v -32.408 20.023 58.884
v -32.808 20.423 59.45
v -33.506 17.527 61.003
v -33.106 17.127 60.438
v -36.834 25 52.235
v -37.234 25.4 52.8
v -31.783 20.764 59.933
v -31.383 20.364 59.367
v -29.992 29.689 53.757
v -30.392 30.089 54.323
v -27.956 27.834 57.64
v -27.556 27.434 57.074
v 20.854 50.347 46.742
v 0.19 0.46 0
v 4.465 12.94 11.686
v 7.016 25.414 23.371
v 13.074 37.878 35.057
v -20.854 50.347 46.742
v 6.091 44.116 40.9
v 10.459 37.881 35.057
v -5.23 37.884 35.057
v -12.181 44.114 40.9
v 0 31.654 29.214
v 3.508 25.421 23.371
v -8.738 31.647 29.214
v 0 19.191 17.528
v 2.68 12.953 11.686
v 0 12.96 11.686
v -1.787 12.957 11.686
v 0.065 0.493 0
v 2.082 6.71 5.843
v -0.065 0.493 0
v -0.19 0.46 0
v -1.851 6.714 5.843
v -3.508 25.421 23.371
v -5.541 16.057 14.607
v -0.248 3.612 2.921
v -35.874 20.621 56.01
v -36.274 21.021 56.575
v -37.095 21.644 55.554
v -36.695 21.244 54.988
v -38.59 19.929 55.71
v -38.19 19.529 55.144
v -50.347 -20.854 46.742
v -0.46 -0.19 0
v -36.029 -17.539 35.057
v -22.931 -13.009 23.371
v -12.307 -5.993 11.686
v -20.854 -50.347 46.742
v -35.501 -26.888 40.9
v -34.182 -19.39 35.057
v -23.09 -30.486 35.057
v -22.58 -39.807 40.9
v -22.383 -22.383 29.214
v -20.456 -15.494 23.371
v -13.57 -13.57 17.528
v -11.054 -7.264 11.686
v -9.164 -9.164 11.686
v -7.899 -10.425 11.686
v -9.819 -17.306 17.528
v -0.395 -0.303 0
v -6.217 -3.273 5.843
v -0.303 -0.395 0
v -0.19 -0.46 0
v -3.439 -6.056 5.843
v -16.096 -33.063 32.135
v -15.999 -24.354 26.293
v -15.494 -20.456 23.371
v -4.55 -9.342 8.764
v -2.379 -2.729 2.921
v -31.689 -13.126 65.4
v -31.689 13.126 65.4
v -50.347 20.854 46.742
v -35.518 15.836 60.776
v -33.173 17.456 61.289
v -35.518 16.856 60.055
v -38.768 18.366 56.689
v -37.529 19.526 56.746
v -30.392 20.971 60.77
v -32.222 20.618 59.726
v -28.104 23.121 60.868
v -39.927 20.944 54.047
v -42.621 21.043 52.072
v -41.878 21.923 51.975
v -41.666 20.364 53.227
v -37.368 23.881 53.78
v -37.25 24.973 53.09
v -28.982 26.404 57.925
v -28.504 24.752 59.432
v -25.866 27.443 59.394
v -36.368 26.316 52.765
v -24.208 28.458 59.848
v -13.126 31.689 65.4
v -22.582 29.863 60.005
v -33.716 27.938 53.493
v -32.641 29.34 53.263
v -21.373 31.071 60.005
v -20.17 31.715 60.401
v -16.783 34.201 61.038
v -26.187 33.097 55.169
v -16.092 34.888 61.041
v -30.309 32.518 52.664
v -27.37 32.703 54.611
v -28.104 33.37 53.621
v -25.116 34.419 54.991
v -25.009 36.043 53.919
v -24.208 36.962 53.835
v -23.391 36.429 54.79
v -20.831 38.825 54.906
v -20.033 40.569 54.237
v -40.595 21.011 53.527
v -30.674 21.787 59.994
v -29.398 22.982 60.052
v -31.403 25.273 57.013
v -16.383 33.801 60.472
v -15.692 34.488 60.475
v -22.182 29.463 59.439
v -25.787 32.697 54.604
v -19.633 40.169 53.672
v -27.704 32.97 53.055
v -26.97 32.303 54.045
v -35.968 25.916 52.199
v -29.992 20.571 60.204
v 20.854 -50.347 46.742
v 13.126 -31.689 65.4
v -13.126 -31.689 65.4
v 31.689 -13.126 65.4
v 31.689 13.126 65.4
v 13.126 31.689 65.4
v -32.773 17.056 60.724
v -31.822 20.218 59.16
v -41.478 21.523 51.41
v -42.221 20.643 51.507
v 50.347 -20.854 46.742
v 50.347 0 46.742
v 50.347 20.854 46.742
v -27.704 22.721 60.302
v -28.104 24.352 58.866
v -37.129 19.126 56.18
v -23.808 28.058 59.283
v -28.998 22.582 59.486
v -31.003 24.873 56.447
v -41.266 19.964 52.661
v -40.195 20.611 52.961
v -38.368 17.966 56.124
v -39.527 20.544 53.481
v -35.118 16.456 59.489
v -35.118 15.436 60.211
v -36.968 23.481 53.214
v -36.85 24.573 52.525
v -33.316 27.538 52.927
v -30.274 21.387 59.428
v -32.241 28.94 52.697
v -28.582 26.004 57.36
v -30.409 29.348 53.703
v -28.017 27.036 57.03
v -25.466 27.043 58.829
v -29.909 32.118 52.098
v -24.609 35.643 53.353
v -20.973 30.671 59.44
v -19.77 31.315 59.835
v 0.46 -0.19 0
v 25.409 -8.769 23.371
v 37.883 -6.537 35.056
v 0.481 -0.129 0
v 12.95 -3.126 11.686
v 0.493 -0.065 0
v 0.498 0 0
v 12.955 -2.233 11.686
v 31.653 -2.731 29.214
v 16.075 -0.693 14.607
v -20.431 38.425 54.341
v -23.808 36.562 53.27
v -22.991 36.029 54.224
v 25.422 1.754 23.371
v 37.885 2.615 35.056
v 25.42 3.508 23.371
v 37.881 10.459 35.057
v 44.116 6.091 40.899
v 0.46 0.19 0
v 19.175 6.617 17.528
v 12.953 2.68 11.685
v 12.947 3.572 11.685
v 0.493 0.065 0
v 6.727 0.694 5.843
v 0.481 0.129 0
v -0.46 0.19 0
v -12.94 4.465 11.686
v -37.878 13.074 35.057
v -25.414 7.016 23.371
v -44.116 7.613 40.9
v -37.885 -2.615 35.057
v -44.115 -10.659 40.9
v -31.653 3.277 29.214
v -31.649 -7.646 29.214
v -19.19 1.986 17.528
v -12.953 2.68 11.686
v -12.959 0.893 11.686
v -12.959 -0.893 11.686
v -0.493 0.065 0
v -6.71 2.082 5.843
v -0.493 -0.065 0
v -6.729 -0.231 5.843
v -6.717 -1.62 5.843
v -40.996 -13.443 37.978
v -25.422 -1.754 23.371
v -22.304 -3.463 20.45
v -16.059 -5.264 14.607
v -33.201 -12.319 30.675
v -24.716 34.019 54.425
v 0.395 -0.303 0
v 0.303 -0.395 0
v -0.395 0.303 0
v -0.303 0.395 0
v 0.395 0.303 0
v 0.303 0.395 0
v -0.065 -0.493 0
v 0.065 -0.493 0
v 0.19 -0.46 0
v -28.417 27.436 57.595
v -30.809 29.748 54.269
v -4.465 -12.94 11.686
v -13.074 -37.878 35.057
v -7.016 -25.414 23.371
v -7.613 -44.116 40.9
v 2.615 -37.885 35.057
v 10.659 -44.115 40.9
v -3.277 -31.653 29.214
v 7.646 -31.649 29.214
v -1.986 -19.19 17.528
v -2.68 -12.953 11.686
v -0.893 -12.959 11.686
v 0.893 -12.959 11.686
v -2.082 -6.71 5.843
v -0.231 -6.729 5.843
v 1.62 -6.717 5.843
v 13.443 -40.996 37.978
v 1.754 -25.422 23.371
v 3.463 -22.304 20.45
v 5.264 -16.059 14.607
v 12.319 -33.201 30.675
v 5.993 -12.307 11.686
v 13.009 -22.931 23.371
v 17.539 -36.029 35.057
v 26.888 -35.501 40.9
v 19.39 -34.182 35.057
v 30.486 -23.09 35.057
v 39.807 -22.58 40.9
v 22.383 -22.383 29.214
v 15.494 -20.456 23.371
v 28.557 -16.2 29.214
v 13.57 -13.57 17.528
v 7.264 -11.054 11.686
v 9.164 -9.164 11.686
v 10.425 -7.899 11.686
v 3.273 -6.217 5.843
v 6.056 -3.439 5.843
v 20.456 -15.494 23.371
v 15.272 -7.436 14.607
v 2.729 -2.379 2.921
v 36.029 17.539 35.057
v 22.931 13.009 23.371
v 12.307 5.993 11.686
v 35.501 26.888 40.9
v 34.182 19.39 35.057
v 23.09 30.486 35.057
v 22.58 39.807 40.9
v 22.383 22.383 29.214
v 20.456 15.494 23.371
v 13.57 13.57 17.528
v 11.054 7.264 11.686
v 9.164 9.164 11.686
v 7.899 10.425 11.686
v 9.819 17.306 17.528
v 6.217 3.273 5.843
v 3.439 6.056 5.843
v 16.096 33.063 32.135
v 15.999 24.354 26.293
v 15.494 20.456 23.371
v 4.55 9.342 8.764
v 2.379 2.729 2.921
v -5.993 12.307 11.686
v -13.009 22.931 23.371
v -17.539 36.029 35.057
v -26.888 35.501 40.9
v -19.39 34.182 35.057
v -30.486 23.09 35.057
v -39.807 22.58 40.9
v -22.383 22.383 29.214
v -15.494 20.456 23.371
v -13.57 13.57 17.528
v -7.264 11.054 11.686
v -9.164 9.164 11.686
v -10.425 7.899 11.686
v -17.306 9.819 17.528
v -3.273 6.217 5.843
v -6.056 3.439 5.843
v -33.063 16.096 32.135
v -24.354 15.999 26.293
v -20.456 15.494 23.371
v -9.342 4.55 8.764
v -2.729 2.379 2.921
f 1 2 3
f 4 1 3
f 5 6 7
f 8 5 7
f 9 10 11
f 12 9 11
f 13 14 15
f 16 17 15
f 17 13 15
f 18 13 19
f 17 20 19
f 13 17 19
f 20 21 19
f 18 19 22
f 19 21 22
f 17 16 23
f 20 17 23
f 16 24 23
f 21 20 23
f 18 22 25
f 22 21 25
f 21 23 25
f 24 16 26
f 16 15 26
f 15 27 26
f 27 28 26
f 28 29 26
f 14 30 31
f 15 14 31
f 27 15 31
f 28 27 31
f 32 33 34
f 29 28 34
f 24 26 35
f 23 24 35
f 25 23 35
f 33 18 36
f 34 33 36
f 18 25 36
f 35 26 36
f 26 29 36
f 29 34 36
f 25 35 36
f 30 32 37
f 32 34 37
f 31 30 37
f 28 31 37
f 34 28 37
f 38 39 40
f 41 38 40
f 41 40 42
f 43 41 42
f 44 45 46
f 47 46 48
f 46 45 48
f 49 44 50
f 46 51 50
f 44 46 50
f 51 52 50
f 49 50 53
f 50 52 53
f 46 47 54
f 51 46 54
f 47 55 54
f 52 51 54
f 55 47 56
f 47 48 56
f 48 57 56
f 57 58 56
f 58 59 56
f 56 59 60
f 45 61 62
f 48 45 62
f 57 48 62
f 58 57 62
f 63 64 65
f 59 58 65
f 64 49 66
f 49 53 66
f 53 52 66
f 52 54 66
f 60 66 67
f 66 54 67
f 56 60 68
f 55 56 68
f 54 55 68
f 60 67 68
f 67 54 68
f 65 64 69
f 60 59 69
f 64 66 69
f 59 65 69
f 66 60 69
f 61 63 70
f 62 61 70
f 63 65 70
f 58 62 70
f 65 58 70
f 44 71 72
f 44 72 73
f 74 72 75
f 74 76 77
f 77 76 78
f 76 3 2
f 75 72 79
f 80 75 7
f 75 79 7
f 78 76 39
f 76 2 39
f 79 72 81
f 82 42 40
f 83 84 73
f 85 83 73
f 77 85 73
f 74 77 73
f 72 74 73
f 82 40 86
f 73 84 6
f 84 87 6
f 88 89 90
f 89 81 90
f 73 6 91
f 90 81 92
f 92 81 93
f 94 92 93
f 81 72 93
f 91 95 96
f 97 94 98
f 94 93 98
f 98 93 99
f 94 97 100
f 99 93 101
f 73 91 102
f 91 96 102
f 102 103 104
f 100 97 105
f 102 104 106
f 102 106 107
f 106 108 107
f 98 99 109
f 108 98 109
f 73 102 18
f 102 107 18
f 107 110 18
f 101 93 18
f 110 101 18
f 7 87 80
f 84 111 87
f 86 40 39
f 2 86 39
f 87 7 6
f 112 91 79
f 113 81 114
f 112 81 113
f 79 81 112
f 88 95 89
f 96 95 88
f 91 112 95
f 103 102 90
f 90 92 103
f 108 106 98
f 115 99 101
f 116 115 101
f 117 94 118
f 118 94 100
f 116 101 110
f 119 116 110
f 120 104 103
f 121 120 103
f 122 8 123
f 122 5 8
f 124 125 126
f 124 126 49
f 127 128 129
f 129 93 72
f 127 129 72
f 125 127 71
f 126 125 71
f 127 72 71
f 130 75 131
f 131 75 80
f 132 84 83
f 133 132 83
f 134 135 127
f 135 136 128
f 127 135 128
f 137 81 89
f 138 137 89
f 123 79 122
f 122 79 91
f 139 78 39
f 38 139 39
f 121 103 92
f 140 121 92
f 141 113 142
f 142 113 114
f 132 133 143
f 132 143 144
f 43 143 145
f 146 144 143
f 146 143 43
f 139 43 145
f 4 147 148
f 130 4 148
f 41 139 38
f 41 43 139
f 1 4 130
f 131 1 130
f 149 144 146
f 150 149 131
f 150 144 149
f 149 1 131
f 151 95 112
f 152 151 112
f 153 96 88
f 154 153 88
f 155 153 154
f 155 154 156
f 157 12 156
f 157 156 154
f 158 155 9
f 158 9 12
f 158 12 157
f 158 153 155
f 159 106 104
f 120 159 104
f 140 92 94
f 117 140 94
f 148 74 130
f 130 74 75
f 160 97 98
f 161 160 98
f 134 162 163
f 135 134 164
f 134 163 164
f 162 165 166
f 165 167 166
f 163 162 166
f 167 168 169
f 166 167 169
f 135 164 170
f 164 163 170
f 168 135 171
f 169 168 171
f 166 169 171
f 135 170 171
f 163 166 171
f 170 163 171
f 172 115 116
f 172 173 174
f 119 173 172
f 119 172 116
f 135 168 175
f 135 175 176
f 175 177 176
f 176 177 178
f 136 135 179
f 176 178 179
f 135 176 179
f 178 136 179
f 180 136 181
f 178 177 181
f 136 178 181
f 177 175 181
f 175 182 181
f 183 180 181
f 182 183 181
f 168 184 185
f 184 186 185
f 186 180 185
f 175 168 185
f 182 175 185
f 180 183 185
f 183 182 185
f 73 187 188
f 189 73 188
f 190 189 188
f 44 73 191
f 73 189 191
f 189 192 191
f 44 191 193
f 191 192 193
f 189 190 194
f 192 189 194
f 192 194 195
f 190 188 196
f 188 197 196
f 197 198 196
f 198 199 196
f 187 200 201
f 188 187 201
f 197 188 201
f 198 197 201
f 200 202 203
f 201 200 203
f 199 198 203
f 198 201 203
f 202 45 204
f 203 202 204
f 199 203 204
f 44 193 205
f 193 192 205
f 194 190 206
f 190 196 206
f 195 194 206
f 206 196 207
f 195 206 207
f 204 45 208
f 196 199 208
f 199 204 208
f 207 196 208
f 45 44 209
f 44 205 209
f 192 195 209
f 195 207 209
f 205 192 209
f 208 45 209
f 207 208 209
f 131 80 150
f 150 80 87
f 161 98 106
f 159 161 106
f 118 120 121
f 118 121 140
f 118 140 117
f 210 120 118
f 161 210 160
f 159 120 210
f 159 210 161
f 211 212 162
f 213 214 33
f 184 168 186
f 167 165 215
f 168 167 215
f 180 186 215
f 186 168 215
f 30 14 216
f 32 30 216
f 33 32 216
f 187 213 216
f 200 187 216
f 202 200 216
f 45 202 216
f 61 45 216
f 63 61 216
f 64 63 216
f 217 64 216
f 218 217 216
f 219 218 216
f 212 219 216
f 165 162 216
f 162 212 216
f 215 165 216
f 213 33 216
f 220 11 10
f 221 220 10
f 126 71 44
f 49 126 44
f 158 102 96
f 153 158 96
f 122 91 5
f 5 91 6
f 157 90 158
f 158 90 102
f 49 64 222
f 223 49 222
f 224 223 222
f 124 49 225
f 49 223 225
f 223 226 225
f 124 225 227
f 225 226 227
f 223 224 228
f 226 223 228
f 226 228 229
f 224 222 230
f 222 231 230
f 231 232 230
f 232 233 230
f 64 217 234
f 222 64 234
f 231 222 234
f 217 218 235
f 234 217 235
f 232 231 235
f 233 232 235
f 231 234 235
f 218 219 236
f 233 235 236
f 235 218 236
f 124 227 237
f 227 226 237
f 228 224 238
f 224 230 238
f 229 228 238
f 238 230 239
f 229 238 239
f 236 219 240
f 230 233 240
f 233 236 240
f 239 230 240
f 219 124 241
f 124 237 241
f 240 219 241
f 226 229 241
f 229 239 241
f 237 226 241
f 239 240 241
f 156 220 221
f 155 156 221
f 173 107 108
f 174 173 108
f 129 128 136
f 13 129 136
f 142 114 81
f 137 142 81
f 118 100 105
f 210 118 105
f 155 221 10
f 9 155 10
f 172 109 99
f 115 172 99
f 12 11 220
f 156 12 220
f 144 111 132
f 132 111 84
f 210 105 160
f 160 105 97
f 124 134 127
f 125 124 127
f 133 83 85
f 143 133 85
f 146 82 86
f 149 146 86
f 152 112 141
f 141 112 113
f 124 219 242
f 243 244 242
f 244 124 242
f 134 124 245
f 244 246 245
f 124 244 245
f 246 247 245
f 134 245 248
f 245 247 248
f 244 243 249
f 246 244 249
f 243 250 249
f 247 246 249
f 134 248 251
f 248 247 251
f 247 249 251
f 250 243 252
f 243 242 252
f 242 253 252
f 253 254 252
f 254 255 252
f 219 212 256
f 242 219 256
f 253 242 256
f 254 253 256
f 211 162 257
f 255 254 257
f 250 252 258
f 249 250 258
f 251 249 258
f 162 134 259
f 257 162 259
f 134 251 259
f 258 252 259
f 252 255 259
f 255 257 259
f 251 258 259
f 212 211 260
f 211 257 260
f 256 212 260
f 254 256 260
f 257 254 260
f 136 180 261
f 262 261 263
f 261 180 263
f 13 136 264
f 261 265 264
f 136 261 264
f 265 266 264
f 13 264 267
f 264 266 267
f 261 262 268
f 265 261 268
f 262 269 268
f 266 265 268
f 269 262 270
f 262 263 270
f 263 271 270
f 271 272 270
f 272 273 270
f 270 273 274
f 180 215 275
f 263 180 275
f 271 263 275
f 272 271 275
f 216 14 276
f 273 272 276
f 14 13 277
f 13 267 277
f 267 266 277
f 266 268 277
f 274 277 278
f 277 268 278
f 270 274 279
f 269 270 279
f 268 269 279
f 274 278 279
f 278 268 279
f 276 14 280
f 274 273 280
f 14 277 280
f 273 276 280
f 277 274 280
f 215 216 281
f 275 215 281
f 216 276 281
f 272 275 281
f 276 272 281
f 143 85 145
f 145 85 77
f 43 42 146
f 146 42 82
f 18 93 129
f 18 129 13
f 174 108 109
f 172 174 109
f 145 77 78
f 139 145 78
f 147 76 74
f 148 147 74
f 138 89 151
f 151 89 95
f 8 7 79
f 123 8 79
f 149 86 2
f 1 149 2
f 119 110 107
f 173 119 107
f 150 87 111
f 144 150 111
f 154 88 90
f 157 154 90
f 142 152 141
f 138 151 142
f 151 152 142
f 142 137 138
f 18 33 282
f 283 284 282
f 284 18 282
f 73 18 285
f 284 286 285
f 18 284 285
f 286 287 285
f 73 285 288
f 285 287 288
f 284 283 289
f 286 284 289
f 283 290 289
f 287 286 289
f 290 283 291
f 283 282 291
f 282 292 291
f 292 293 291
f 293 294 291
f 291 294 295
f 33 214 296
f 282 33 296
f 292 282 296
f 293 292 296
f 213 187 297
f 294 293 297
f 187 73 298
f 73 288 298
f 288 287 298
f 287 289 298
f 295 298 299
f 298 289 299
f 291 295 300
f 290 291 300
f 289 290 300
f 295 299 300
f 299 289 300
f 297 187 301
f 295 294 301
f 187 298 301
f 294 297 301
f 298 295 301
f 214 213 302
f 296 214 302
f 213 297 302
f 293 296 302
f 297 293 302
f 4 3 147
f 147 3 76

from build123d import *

# Parameters (mm, degrees)
F0_R         = 0.4976358306
F4_DEPTH     = 17.4
F5_T1_DEPTH  = 145.6880456822
F5_T3_DEPTH  = 145.6880456822
F5_T5_DEPTH  = 145.6880456822
F5_T7_DEPTH  = 145.6880456822
F5_T9_DEPTH  = 145.6880456822
F5_T11_DEPTH = 145.6880456822
F7_DEPTH     = 0.8


# Not quite as in the source:
# - a fillet or chamfer that OpenCascade refuses, or shapes differently, is made with other operations: its cross-section is extruded or revolved along the edge and cut away or added


with BuildPart() as f3:
    # F2 (on offset) → F3 section 0
    with BuildSketch(Plane.XY.offset(48)):
        Polygon((21.4103630818, 51.6891889274), (-21.4103630818, 51.6891889274), (-51.6891889274, 21.4103630818), (-51.6891889274, -21.4103630818), (-21.4103630818, -51.6891889274), (21.4103630818, -51.6891889274), (51.6891889274, -21.4103630818), (51.6891889274, 21.4103630818), align=None)
    # F0 (on Top) → F3 section 1
    with BuildSketch(Plane.XY):
        Circle(F0_R)
    loft()

    # F4 (add): a face of the model
    f4_faces = [f3.faces().sort_by_distance(p)[0] for p in [
        (0, 0, 48),
    ]]
    extrude(f4_faces, amount=F4_DEPTH)

    # F5: chamfer of 20 on 8 edges, made by hand

    # F5_s2 → F5_t1 (cut)
    with BuildSketch(Plane(origin=(-51.5085025199, -51.5085025199, 0), x_dir=(0, 0, 1), z_dir=(0.7071067812, 0.7071067812, 0))):
        Polygon((45.4, 51.6891889274), (65.4, 31.6891889274), (65.4, 51.6891889274), align=None)
    extrude(amount=F5_T1_DEPTH, mode=Mode.SUBTRACT)

    # F5_s4 → F5_t3 (cut)
    with BuildSketch(Plane.YZ.offset(-72.8440228411)):
        Polygon((-31.6891889274, 65.4), (-51.6891889274, 45.4), (-51.6891889274, 65.4), align=None)
        Polygon((31.6891889274, 65.4), (51.6891889274, 45.4), (51.6891889274, 65.4), align=None)
    extrude(amount=F5_T3_DEPTH, mode=Mode.SUBTRACT)

    # F5_s6 → F5_t5 (cut)
    with BuildSketch(Plane(origin=(-51.5085025199, 51.5085025199, 0), x_dir=(0, 0, 1), z_dir=(0.7071067812, -0.7071067812, 0))):
        Polygon((65.4, 31.6891889274), (45.4, 51.6891889274), (65.4, 51.6891889274), align=None)
    extrude(amount=F5_T5_DEPTH, mode=Mode.SUBTRACT)

    # F5_s8 → F5_t7 (cut)
    with BuildSketch(Plane.XZ.offset(-72.8440228411)):
        Polygon((51.6891889274, 45.4), (31.6891889274, 65.4), (51.6891889274, 65.4), align=None)
        Polygon((-31.6891889274, 65.4), (-51.6891889274, 45.4), (-51.6891889274, 65.4), align=None)
    extrude(amount=F5_T7_DEPTH, mode=Mode.SUBTRACT)

    # F5_s10 → F5_t9 (cut)
    with BuildSketch(Plane(origin=(51.5085025199, 51.5085025199, 0), x_dir=(0, 0, 1), z_dir=(-0.7071067812, -0.7071067812, 0))):
        Polygon((65.4, 31.6891889274), (45.4, 51.6891889274), (65.4, 51.6891889274), align=None)
    extrude(amount=F5_T9_DEPTH, mode=Mode.SUBTRACT)

    # F5_s12 → F5_t11 (cut)
    with BuildSketch(Plane(origin=(51.5085025199, -51.5085025199, 0), x_dir=(0, 0, 1), z_dir=(-0.7071067812, 0.7071067812, 0))):
        Polygon((65.4, 31.6891889274), (45.4, 51.6891889274), (65.4, 51.6891889274), align=None)
    extrude(amount=F5_T11_DEPTH, mode=Mode.SUBTRACT)

    # F6 (on face) → F7 (cut)
    with BuildSketch(Plane(origin=(-34.3262119352, 34.3262119352, 48.5445944637), x_dir=(0.8660254038, 0.2886751346, 0.4082482905), z_dir=(-0.5, 0.5, 0.7071067812))):
        Polygon((20.256810503, -7.3152106315), (21.0549216717, -6.755489856), (16.5048241615, 1.810487709), (11.6832025843, -0.902343074), (12.6268315784, -1.8886970465), (15.5827937516, 0), align=None)
        Polygon((7.1851625107, -3.7115143208), (8.0320088518, -4.8281169212), (11.6832025843, -11.3175281272), (13.5610239533, -10.2609931974), (9.3989199392, -4.8281169212), (10.6345172528, -3.6460408281), (14.9572589197, -9.2744808388), (16.3466744125, -8.9773000983), (10.7584019824, -1.7010715934), align=None)
        Polygon((6.170399487, -11.8845931934), (9.7690848634, -11.8845931934), (4.6387440525, -3.8551988546), (1.9462815717, -6.7955303045), align=None)
        Polygon((4.0612965822, -7.0431958884), (4.5432327315, -6.7955303045), (7.355309773, -10.5520610512), (6.8237950711, -10.8511117796), align=None, mode=Mode.SUBTRACT)
        Polygon((7.1851625107, -16.2641853094), (6.7229871638, -14.1033669934), (0.7042393052, -8.0728225242), (4.2175897397, -16.8479587883), (5.6911348405, -15.9064446157), (3.3750016382, -12.2815106186), align=None)
        Polygon((2.9365293457, -17.6483038813), (4.5432327315, -17.9625210545), (-2.3575761854, -8.9773000983), (-3.3578095237, -9.7454970267), align=None)
        Polygon((0.946887175, -20.9094267339), (-1.3764705509, -20.9094267339), (-1.3764705509, -22.1590939909), (1.3320371509, -21.1326684803), (2.4291982409, -17.6483038813), (-3.3762898288, -10.2609931974), (-7.2390597263, -13.7484027895), (-8.7199002404, -12.10817499), (-9.5777362585, -12.8826517612), (-8.4756426513, -14.1033669934), (-5.128640122, -17.7334435545), (-3.6981627345, -16.819447279), (-2.2488206246, -15.5000568389), (-3.1974268837, -14.4016498716), (-4.9229765081, -15.8918690917), (-6.4675627457, -14.1033669934), (-3.5124101047, -11.5512379779), (1.7531381398, -17.6483038813), align=None)
    extrude(amount=-F7_DEPTH, mode=Mode.SUBTRACT)


solid = f3.part
